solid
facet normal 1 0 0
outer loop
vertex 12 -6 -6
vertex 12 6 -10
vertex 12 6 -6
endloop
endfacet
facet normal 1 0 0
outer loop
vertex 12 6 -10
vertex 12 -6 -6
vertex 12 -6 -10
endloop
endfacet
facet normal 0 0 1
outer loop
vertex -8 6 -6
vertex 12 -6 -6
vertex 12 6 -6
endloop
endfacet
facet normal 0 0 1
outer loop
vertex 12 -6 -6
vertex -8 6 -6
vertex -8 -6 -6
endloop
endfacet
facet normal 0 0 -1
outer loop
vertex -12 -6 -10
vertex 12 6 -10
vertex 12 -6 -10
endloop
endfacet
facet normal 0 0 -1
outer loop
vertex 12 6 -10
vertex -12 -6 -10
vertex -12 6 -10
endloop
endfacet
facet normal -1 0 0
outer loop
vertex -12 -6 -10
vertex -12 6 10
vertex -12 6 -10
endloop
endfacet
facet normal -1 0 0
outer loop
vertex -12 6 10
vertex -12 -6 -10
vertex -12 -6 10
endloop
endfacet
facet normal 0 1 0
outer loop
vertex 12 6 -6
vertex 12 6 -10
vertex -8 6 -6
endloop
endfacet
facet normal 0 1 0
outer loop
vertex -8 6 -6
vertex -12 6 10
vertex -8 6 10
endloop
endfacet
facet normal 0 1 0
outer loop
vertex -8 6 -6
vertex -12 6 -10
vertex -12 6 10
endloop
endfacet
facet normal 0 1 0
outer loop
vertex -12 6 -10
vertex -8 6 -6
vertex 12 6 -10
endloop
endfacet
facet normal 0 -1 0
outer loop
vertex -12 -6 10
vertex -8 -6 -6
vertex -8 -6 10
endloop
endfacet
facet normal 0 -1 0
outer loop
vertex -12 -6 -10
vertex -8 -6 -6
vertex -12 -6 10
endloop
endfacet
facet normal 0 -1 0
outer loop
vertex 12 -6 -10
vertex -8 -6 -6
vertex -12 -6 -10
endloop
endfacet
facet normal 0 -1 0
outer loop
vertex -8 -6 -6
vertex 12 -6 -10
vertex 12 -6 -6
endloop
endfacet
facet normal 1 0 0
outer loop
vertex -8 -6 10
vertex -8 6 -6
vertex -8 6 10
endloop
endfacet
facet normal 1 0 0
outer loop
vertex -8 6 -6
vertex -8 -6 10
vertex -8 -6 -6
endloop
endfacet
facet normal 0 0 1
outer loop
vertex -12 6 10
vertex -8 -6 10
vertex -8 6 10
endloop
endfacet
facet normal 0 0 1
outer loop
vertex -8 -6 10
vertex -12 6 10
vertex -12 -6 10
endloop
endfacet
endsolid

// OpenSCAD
// Auto-generated from tests/data/feature_fixtures_manifest.json
// fixture: l_bracket_plain
// fixture_type: l_bracket
// description: Plain L-bracket baseline: L-shaped cross-section extruded along Y; positive for linear_extrude_solid.
$fn = 96;

bracket_size = [24.000000, 12.000000, 20.000000];
leg_thickness = 4.000000;
bracket_origin = [-12.000000, -6.000000, -10.000000];

union() {
  translate(bracket_origin) cube([bracket_size[0], bracket_size[1], leg_thickness]);
  translate(bracket_origin) cube([leg_thickness, bracket_size[1], bracket_size[2]]);
}
